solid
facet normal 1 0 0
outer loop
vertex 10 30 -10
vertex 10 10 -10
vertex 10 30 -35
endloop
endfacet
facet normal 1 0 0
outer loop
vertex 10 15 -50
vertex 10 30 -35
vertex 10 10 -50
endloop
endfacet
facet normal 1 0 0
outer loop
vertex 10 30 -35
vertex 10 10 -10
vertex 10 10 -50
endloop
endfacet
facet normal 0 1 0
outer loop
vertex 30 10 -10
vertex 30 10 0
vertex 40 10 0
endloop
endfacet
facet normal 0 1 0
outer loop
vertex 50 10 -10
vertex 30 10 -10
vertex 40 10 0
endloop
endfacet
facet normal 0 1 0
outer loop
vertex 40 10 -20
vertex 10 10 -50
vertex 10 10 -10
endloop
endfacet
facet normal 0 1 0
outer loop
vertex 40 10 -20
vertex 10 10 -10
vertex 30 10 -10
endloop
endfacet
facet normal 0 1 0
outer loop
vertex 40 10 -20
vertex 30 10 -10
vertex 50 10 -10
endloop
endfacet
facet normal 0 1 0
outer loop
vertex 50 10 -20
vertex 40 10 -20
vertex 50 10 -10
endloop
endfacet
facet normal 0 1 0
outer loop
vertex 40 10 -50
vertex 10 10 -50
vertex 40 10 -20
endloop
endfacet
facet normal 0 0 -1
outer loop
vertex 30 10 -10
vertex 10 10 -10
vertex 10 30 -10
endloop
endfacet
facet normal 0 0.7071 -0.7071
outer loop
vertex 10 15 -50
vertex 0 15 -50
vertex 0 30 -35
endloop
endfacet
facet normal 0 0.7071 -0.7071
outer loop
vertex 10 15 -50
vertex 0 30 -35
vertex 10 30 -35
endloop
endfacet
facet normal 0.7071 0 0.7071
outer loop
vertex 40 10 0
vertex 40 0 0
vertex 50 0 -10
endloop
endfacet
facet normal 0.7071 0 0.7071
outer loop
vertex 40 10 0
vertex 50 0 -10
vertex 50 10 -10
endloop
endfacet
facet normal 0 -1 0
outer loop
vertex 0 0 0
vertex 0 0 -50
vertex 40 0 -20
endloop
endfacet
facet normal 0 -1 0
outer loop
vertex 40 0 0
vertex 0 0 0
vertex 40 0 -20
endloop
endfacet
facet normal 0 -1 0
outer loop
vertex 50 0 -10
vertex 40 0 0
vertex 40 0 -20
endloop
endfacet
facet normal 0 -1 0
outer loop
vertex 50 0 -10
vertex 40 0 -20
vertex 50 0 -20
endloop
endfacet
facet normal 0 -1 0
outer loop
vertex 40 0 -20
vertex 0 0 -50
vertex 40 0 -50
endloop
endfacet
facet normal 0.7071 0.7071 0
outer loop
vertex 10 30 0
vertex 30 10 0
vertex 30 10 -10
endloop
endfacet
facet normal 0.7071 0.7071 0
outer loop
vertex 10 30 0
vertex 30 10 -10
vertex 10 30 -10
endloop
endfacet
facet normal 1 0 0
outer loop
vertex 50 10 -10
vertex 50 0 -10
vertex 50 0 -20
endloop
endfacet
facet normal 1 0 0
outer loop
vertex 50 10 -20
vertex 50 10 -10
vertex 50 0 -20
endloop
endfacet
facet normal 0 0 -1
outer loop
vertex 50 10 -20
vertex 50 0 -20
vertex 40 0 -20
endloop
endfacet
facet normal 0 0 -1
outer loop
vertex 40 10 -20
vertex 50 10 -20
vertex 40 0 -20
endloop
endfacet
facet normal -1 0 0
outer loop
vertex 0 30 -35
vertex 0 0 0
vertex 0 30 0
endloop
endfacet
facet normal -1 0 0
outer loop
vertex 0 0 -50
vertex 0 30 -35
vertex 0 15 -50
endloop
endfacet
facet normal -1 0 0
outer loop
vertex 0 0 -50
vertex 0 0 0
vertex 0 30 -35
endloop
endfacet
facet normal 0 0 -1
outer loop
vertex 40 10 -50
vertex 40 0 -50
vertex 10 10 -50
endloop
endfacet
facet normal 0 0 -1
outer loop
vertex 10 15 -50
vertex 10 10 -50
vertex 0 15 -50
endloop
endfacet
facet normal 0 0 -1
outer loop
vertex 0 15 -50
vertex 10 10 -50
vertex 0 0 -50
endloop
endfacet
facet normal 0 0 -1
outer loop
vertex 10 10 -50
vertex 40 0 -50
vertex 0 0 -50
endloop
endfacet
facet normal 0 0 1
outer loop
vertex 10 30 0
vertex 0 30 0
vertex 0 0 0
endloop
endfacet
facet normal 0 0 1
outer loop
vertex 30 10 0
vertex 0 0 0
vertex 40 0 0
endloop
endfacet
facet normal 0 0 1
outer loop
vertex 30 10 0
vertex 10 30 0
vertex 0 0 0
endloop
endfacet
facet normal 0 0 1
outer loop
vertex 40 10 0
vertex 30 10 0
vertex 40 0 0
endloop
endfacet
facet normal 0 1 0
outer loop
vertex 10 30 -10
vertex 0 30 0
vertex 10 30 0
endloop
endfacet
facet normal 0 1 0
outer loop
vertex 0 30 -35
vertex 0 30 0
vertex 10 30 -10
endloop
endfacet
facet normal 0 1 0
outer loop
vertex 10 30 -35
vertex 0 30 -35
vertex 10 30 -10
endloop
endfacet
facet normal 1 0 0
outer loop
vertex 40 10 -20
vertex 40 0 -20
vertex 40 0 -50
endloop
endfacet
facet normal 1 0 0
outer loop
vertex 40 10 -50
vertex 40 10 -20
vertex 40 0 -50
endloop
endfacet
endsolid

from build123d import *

# Parameters (mm, degrees)
SKETCH1_W           = 10
SKETCH1_H           = 50
BOSS_EXTRUDE1_DEPTH = 30
BOSS_EXTRUDE2_DEPTH = 10
CHAMFER1_SIZE       = 10
CHAMFER2_SIZE       = 15
BOSS_EXTRUDE3_DEPTH = 10


with BuildPart() as part:
    # Sketch1 → Boss-Extrude1 (new body)
    with BuildSketch(Plane(origin=(0, 0, 0), x_dir=(1, 0, 0), z_dir=(0, 1, 0))):
        with Locations((5, 25)):
            Rectangle(SKETCH1_W, SKETCH1_H)
    extrude(amount=BOSS_EXTRUDE1_DEPTH)

    # Sketch1<3> → Boss-Extrude2 (add)
    with BuildSketch(Plane(origin=(0, 0, 0), x_dir=(1, 0, 0), z_dir=(0, 1, 0))):
        Polygon((10, 50), (10, 0), (50, 0), (50, 20), (40, 20), (40, 50), align=None)
    extrude(amount=BOSS_EXTRUDE2_DEPTH)

    # Chamfer1
    chamfer1_edges = [part.edges().sort_by_distance(p)[0] for p in [
        (50, 5, 0),
    ]]
    chamfer(chamfer1_edges, length=CHAMFER1_SIZE)

    # Chamfer2
    chamfer2_edges = [part.edges().sort_by_distance(p)[0] for p in [
        (5, 30, -50),
    ]]
    chamfer(chamfer2_edges, length=CHAMFER2_SIZE)

    # Sketch2 → Boss-Extrude3 (add)
    with BuildSketch(Plane.XY):
        Polygon((10, 10), (30, 10), (10, 30), align=None)
    extrude(amount=-BOSS_EXTRUDE3_DEPTH)


solid = part.part
